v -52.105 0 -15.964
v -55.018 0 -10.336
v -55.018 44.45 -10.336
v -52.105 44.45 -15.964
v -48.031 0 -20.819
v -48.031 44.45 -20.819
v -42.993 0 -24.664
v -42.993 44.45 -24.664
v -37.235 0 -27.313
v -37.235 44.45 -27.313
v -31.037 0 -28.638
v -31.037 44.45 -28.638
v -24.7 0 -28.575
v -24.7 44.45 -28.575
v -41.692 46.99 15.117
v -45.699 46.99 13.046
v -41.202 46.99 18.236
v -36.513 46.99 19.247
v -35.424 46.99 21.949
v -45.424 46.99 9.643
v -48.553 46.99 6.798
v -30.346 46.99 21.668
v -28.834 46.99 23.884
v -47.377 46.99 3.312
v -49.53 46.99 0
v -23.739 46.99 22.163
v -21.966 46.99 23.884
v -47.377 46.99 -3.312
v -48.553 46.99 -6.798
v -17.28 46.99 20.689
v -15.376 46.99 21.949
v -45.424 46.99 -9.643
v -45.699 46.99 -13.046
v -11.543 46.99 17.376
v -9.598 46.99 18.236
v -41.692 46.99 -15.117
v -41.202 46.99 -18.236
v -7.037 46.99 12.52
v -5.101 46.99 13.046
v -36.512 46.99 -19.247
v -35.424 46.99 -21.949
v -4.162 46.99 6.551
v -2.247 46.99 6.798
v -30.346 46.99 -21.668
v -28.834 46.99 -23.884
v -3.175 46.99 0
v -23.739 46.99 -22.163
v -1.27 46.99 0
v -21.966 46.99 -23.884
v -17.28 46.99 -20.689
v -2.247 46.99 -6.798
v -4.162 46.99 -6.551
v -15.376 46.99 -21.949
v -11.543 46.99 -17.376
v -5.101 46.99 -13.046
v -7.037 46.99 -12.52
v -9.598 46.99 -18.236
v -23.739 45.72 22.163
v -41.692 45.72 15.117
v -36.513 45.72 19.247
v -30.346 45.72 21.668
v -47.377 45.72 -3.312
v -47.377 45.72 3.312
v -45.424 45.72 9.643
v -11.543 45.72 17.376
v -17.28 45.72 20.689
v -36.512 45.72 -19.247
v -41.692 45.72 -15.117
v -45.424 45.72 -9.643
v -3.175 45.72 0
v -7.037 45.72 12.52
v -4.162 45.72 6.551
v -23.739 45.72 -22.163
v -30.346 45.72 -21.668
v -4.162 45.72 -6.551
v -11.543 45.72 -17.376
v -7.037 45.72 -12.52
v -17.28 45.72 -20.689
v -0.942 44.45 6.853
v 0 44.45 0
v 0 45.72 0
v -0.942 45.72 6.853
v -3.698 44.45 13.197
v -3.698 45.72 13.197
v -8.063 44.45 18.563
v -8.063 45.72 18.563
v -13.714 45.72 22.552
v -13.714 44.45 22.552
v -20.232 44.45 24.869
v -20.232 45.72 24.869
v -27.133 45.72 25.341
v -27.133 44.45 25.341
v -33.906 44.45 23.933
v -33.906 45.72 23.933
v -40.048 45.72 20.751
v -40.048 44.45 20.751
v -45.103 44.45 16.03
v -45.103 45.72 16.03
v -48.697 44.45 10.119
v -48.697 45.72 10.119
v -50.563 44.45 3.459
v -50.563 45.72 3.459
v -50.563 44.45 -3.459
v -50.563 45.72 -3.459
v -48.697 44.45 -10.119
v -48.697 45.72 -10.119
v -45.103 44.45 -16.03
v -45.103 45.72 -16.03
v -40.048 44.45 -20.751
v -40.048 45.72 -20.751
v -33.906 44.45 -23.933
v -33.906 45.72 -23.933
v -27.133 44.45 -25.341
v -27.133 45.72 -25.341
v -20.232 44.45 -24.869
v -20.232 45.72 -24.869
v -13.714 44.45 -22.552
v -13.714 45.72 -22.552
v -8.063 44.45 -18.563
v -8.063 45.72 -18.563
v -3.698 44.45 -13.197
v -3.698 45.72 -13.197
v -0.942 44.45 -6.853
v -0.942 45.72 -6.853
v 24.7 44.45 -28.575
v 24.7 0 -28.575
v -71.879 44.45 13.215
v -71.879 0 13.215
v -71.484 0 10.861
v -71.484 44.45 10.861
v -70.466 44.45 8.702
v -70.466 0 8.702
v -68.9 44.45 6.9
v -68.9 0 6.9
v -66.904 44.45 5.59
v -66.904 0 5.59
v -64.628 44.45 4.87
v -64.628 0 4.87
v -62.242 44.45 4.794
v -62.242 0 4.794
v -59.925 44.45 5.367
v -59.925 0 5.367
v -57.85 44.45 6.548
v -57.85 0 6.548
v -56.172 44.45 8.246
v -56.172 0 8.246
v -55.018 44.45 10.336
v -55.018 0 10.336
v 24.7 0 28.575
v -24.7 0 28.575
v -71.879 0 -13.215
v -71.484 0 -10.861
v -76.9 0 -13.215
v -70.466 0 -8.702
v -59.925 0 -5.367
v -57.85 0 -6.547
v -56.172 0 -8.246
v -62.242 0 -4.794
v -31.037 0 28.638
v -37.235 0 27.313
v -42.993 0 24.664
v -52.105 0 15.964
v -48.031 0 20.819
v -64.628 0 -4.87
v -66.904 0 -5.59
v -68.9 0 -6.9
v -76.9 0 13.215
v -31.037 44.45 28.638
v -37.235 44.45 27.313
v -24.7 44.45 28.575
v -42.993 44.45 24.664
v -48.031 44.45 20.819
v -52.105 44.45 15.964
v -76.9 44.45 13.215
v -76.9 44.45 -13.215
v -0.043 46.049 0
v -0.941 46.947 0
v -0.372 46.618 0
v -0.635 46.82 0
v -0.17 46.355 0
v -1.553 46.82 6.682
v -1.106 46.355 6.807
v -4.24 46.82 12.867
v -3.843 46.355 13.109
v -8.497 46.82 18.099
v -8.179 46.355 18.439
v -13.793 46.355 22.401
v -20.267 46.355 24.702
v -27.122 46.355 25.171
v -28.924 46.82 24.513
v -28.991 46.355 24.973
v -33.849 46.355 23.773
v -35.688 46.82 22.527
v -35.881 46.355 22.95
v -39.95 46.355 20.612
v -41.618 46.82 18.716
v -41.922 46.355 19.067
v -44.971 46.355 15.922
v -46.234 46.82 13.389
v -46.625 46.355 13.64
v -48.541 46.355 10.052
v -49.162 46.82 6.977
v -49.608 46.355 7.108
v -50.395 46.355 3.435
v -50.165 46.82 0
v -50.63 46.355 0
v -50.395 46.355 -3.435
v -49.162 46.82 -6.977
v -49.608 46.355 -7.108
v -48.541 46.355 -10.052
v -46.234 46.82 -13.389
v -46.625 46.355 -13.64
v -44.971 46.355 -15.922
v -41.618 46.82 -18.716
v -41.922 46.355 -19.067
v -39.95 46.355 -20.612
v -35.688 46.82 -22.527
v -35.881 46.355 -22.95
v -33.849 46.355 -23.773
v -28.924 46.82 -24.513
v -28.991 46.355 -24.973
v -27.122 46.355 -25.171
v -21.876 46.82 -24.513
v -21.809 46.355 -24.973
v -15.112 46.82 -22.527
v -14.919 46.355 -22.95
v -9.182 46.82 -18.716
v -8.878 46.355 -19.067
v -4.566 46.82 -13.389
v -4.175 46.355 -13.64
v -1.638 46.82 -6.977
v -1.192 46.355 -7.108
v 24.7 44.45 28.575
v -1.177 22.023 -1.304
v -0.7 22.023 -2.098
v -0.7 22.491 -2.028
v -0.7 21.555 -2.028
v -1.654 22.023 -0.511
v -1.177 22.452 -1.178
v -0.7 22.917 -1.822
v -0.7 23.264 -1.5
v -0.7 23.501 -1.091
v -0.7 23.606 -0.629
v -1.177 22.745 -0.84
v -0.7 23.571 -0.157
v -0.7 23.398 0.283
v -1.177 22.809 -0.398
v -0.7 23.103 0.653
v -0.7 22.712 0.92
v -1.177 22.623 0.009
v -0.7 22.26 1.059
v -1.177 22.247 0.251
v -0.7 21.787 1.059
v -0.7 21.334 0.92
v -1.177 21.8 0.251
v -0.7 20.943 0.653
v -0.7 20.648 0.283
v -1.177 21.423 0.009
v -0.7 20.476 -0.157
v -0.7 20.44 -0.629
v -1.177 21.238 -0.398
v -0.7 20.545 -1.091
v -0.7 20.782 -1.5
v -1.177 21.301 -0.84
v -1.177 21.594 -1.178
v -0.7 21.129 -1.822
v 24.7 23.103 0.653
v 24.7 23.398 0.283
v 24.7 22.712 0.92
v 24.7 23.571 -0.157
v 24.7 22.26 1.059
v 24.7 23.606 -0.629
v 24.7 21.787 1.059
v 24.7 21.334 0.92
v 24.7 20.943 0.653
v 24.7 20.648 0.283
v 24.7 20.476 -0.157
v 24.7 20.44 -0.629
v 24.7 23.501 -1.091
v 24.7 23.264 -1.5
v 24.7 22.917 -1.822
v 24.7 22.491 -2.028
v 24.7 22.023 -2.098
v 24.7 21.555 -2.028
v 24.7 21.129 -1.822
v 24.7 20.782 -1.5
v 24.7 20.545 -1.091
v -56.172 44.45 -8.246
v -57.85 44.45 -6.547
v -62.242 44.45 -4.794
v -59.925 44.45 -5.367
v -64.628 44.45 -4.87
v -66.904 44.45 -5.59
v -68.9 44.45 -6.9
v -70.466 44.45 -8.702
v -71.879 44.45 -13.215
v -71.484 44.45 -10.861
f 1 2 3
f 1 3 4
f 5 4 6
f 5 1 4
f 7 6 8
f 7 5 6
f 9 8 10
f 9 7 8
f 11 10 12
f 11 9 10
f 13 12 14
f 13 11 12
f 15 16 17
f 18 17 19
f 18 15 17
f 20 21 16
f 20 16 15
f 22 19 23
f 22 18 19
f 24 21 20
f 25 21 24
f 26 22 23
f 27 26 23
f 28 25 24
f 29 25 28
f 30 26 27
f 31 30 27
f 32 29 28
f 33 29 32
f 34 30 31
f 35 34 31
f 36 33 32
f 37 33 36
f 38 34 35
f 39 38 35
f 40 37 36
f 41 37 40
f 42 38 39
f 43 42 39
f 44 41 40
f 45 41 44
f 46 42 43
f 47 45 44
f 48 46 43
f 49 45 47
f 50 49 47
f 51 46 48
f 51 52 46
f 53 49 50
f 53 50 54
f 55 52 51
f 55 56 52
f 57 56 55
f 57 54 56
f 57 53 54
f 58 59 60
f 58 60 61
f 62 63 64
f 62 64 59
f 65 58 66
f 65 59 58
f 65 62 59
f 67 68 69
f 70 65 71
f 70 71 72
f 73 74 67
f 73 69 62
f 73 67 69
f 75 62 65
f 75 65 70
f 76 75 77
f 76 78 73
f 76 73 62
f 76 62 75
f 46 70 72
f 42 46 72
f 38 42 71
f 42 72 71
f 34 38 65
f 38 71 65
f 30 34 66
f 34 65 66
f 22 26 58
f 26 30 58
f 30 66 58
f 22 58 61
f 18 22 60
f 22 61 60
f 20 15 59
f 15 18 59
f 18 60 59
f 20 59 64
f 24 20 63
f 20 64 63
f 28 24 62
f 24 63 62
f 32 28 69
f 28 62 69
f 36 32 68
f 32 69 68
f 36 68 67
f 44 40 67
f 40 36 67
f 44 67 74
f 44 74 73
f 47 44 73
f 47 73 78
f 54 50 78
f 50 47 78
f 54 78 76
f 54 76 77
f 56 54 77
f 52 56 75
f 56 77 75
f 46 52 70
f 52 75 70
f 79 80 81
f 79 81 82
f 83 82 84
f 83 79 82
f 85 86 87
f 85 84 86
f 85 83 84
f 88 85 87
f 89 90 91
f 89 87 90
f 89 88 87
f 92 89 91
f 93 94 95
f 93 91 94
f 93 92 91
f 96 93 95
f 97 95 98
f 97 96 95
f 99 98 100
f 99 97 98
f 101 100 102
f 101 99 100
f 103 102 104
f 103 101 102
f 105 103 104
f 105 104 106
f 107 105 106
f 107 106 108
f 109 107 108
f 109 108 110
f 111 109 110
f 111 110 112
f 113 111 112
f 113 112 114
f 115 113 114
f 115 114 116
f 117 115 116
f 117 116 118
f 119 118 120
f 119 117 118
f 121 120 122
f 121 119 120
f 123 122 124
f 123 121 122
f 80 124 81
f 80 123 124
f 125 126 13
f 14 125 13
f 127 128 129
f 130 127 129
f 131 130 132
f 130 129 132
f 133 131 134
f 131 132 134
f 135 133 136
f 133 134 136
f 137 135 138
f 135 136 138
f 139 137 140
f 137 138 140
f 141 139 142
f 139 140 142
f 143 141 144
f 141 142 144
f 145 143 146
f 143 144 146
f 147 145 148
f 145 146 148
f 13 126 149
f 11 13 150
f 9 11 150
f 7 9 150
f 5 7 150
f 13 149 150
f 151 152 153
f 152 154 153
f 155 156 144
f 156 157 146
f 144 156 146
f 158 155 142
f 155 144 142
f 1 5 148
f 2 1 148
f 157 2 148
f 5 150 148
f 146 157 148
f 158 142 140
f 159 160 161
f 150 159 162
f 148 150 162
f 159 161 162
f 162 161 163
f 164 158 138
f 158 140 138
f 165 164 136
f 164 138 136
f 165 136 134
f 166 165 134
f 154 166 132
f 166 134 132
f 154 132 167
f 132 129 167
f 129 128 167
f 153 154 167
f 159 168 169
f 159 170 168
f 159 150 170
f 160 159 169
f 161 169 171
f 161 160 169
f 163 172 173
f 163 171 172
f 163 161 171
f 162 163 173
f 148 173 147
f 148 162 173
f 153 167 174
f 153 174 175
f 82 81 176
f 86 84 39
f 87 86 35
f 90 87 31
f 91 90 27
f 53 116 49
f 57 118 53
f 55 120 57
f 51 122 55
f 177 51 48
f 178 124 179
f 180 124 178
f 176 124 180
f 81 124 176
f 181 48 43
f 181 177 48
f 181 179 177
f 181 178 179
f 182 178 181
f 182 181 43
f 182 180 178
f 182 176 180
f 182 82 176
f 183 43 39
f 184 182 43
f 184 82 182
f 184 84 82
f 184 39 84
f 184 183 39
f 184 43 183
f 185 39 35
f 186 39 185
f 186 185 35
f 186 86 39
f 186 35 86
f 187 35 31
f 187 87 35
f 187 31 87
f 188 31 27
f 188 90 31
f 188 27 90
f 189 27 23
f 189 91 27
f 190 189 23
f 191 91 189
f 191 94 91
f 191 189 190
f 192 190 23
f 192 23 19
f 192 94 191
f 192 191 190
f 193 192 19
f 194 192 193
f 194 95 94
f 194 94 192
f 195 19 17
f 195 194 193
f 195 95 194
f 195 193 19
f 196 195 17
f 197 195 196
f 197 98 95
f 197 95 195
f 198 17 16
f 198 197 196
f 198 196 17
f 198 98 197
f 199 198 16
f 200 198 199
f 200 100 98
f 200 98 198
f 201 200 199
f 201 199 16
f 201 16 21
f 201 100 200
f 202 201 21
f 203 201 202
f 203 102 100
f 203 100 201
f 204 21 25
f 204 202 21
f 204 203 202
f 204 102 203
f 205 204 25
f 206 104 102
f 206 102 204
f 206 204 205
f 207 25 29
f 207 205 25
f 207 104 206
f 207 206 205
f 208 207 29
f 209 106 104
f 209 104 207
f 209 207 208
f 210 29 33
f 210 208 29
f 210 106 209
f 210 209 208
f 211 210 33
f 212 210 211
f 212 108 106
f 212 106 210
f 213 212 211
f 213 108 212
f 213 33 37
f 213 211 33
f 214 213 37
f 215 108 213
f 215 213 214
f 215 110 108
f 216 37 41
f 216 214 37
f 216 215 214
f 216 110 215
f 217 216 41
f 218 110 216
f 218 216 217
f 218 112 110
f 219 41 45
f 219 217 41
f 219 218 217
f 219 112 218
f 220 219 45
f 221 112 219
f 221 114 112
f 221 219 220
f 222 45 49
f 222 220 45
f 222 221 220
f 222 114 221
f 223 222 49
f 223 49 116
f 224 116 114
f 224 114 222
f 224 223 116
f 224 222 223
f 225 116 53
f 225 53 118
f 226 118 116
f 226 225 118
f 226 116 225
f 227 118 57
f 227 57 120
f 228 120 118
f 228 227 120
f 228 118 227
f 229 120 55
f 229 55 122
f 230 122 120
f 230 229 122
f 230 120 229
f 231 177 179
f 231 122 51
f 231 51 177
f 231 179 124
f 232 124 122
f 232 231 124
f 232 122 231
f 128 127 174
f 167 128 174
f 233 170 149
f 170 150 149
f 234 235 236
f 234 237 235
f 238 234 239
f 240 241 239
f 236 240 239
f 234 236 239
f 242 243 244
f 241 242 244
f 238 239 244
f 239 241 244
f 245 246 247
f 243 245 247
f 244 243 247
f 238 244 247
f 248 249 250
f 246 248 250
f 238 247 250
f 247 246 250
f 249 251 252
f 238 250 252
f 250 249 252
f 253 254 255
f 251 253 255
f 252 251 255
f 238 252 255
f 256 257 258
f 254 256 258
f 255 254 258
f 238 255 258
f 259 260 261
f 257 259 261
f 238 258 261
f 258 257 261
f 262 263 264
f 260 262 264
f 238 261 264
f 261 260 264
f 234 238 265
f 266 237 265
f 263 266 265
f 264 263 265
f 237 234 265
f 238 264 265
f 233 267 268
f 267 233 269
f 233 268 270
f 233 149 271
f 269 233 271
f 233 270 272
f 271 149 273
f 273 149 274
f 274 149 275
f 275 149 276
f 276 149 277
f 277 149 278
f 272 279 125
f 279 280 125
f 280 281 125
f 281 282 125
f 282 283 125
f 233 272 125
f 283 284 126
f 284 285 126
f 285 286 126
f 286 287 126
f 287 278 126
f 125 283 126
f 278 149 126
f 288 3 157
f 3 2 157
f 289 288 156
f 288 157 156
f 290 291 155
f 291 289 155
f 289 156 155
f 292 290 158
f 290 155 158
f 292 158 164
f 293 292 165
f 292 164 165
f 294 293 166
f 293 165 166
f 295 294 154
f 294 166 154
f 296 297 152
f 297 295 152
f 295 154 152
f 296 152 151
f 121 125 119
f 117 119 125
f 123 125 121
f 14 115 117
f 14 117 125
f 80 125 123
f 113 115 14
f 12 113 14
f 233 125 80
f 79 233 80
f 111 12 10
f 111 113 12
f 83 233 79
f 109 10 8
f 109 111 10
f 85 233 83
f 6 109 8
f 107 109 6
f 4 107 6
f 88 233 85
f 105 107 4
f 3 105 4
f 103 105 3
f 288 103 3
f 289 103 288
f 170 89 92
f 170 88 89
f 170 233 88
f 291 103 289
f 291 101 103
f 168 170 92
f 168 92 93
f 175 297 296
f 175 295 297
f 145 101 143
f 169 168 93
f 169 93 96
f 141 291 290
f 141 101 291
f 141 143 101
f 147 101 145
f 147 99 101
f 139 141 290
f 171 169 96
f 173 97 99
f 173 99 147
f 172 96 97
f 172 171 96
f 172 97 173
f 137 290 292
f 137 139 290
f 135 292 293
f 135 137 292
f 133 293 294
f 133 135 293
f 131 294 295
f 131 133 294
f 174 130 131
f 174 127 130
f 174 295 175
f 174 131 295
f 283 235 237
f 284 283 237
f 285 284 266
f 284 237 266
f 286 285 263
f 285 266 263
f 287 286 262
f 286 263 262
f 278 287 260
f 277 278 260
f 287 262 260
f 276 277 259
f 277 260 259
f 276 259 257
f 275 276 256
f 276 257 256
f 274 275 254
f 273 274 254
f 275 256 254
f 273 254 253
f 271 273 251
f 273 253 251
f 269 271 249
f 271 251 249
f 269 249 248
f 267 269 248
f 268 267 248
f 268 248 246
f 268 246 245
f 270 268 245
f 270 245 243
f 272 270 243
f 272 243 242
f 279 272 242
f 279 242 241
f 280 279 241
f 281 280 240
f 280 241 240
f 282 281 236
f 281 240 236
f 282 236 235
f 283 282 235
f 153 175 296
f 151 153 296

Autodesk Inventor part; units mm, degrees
ref_plane "YZ Plane" through (0, 0, 0) normal (1, 0, 0) x (0, 1, 0)
ref_plane "XZ Plane" through (0, 0, 0) normal (0, 1, 0) x (-1, 0, 0)
ref_plane "XY Plane" through (0, 0, 0) normal (0, 0, 1) x (1, 0, 0)
sketch "Sketch1" plane through (0, 0, 0) normal (0, 1, 0) x (-1, 0, 0)
  line L0 (-24.6998, -28.575) -> (24.6998, -28.575)
  line L1 (24.6998, 28.575) -> (-24.6998, 28.575)
  line L2 (-24.6998, 28.575) -> (-24.6998, -28.575)
  line L3 (-24.6998, -28.575) -> (24.6998, 28.575) construction
  line L4 (24.6998, -28.575) -> (-24.6998, 28.575) construction
  arc A0 (55.0184, 10.3359) -> (71.8794, 13.215) centre (63.1598, 13.4684) ccw
  line L5 (74.3603, 0) -> (-43.8805, 0)
  arc A1 (71.8794, -13.215) -> (55.0184, -10.3359) centre (63.1598, -13.4684) ccw
  line L6 (71.8794, 13.215) -> (76.9002, 13.215)
  line L7 (76.9002, 13.215) -> (76.9002, -13.215)
  line L8 (76.9002, -13.215) -> (71.8794, -13.215)
  arc A2 (55.0184, 10.3359) -> (24.6998, 28.575) centre (28.155, 0) ccw
  arc A3 (24.6998, -28.575) -> (55.0184, -10.3359) centre (28.155, 0) ccw
  point P0 (0, 0)
  dimension "d1" = 57.15
  dimension "d2" = 101.6
extrude "Extrusion1" add sketch "Sketch1" along normal blind 44.45
hole "Hole1" at (24.6998, 22.0232, -0.5107) direction (-1, 0, 0) diameter 3.175 depth 25.4 tip angle 118
sketch "Sketch2" plane through (0, 44.45, 0) normal (0, 1, 0) x (1, 0, 0)
  circle A0 centre (-25.4, 0) radius 25.4
  circle A1 centre (-25.4, 0) radius 22.225
  point P0 (0, 0)
  dimension "d14" = 50.8
  dimension "d15" = 25.4
  dimension "d18" = 44.45
extrude "Extrusion3" add sketch "Sketch2" along normal blind 2.54
extrude "Extrusion4" add sketch "Sketch2" along normal blind 1.27 contours A1
fillet "Fillet1" radius 1.27 1 edges at (-50.8, 46.99, 0)
properties part number "Durometer_Sensor"
